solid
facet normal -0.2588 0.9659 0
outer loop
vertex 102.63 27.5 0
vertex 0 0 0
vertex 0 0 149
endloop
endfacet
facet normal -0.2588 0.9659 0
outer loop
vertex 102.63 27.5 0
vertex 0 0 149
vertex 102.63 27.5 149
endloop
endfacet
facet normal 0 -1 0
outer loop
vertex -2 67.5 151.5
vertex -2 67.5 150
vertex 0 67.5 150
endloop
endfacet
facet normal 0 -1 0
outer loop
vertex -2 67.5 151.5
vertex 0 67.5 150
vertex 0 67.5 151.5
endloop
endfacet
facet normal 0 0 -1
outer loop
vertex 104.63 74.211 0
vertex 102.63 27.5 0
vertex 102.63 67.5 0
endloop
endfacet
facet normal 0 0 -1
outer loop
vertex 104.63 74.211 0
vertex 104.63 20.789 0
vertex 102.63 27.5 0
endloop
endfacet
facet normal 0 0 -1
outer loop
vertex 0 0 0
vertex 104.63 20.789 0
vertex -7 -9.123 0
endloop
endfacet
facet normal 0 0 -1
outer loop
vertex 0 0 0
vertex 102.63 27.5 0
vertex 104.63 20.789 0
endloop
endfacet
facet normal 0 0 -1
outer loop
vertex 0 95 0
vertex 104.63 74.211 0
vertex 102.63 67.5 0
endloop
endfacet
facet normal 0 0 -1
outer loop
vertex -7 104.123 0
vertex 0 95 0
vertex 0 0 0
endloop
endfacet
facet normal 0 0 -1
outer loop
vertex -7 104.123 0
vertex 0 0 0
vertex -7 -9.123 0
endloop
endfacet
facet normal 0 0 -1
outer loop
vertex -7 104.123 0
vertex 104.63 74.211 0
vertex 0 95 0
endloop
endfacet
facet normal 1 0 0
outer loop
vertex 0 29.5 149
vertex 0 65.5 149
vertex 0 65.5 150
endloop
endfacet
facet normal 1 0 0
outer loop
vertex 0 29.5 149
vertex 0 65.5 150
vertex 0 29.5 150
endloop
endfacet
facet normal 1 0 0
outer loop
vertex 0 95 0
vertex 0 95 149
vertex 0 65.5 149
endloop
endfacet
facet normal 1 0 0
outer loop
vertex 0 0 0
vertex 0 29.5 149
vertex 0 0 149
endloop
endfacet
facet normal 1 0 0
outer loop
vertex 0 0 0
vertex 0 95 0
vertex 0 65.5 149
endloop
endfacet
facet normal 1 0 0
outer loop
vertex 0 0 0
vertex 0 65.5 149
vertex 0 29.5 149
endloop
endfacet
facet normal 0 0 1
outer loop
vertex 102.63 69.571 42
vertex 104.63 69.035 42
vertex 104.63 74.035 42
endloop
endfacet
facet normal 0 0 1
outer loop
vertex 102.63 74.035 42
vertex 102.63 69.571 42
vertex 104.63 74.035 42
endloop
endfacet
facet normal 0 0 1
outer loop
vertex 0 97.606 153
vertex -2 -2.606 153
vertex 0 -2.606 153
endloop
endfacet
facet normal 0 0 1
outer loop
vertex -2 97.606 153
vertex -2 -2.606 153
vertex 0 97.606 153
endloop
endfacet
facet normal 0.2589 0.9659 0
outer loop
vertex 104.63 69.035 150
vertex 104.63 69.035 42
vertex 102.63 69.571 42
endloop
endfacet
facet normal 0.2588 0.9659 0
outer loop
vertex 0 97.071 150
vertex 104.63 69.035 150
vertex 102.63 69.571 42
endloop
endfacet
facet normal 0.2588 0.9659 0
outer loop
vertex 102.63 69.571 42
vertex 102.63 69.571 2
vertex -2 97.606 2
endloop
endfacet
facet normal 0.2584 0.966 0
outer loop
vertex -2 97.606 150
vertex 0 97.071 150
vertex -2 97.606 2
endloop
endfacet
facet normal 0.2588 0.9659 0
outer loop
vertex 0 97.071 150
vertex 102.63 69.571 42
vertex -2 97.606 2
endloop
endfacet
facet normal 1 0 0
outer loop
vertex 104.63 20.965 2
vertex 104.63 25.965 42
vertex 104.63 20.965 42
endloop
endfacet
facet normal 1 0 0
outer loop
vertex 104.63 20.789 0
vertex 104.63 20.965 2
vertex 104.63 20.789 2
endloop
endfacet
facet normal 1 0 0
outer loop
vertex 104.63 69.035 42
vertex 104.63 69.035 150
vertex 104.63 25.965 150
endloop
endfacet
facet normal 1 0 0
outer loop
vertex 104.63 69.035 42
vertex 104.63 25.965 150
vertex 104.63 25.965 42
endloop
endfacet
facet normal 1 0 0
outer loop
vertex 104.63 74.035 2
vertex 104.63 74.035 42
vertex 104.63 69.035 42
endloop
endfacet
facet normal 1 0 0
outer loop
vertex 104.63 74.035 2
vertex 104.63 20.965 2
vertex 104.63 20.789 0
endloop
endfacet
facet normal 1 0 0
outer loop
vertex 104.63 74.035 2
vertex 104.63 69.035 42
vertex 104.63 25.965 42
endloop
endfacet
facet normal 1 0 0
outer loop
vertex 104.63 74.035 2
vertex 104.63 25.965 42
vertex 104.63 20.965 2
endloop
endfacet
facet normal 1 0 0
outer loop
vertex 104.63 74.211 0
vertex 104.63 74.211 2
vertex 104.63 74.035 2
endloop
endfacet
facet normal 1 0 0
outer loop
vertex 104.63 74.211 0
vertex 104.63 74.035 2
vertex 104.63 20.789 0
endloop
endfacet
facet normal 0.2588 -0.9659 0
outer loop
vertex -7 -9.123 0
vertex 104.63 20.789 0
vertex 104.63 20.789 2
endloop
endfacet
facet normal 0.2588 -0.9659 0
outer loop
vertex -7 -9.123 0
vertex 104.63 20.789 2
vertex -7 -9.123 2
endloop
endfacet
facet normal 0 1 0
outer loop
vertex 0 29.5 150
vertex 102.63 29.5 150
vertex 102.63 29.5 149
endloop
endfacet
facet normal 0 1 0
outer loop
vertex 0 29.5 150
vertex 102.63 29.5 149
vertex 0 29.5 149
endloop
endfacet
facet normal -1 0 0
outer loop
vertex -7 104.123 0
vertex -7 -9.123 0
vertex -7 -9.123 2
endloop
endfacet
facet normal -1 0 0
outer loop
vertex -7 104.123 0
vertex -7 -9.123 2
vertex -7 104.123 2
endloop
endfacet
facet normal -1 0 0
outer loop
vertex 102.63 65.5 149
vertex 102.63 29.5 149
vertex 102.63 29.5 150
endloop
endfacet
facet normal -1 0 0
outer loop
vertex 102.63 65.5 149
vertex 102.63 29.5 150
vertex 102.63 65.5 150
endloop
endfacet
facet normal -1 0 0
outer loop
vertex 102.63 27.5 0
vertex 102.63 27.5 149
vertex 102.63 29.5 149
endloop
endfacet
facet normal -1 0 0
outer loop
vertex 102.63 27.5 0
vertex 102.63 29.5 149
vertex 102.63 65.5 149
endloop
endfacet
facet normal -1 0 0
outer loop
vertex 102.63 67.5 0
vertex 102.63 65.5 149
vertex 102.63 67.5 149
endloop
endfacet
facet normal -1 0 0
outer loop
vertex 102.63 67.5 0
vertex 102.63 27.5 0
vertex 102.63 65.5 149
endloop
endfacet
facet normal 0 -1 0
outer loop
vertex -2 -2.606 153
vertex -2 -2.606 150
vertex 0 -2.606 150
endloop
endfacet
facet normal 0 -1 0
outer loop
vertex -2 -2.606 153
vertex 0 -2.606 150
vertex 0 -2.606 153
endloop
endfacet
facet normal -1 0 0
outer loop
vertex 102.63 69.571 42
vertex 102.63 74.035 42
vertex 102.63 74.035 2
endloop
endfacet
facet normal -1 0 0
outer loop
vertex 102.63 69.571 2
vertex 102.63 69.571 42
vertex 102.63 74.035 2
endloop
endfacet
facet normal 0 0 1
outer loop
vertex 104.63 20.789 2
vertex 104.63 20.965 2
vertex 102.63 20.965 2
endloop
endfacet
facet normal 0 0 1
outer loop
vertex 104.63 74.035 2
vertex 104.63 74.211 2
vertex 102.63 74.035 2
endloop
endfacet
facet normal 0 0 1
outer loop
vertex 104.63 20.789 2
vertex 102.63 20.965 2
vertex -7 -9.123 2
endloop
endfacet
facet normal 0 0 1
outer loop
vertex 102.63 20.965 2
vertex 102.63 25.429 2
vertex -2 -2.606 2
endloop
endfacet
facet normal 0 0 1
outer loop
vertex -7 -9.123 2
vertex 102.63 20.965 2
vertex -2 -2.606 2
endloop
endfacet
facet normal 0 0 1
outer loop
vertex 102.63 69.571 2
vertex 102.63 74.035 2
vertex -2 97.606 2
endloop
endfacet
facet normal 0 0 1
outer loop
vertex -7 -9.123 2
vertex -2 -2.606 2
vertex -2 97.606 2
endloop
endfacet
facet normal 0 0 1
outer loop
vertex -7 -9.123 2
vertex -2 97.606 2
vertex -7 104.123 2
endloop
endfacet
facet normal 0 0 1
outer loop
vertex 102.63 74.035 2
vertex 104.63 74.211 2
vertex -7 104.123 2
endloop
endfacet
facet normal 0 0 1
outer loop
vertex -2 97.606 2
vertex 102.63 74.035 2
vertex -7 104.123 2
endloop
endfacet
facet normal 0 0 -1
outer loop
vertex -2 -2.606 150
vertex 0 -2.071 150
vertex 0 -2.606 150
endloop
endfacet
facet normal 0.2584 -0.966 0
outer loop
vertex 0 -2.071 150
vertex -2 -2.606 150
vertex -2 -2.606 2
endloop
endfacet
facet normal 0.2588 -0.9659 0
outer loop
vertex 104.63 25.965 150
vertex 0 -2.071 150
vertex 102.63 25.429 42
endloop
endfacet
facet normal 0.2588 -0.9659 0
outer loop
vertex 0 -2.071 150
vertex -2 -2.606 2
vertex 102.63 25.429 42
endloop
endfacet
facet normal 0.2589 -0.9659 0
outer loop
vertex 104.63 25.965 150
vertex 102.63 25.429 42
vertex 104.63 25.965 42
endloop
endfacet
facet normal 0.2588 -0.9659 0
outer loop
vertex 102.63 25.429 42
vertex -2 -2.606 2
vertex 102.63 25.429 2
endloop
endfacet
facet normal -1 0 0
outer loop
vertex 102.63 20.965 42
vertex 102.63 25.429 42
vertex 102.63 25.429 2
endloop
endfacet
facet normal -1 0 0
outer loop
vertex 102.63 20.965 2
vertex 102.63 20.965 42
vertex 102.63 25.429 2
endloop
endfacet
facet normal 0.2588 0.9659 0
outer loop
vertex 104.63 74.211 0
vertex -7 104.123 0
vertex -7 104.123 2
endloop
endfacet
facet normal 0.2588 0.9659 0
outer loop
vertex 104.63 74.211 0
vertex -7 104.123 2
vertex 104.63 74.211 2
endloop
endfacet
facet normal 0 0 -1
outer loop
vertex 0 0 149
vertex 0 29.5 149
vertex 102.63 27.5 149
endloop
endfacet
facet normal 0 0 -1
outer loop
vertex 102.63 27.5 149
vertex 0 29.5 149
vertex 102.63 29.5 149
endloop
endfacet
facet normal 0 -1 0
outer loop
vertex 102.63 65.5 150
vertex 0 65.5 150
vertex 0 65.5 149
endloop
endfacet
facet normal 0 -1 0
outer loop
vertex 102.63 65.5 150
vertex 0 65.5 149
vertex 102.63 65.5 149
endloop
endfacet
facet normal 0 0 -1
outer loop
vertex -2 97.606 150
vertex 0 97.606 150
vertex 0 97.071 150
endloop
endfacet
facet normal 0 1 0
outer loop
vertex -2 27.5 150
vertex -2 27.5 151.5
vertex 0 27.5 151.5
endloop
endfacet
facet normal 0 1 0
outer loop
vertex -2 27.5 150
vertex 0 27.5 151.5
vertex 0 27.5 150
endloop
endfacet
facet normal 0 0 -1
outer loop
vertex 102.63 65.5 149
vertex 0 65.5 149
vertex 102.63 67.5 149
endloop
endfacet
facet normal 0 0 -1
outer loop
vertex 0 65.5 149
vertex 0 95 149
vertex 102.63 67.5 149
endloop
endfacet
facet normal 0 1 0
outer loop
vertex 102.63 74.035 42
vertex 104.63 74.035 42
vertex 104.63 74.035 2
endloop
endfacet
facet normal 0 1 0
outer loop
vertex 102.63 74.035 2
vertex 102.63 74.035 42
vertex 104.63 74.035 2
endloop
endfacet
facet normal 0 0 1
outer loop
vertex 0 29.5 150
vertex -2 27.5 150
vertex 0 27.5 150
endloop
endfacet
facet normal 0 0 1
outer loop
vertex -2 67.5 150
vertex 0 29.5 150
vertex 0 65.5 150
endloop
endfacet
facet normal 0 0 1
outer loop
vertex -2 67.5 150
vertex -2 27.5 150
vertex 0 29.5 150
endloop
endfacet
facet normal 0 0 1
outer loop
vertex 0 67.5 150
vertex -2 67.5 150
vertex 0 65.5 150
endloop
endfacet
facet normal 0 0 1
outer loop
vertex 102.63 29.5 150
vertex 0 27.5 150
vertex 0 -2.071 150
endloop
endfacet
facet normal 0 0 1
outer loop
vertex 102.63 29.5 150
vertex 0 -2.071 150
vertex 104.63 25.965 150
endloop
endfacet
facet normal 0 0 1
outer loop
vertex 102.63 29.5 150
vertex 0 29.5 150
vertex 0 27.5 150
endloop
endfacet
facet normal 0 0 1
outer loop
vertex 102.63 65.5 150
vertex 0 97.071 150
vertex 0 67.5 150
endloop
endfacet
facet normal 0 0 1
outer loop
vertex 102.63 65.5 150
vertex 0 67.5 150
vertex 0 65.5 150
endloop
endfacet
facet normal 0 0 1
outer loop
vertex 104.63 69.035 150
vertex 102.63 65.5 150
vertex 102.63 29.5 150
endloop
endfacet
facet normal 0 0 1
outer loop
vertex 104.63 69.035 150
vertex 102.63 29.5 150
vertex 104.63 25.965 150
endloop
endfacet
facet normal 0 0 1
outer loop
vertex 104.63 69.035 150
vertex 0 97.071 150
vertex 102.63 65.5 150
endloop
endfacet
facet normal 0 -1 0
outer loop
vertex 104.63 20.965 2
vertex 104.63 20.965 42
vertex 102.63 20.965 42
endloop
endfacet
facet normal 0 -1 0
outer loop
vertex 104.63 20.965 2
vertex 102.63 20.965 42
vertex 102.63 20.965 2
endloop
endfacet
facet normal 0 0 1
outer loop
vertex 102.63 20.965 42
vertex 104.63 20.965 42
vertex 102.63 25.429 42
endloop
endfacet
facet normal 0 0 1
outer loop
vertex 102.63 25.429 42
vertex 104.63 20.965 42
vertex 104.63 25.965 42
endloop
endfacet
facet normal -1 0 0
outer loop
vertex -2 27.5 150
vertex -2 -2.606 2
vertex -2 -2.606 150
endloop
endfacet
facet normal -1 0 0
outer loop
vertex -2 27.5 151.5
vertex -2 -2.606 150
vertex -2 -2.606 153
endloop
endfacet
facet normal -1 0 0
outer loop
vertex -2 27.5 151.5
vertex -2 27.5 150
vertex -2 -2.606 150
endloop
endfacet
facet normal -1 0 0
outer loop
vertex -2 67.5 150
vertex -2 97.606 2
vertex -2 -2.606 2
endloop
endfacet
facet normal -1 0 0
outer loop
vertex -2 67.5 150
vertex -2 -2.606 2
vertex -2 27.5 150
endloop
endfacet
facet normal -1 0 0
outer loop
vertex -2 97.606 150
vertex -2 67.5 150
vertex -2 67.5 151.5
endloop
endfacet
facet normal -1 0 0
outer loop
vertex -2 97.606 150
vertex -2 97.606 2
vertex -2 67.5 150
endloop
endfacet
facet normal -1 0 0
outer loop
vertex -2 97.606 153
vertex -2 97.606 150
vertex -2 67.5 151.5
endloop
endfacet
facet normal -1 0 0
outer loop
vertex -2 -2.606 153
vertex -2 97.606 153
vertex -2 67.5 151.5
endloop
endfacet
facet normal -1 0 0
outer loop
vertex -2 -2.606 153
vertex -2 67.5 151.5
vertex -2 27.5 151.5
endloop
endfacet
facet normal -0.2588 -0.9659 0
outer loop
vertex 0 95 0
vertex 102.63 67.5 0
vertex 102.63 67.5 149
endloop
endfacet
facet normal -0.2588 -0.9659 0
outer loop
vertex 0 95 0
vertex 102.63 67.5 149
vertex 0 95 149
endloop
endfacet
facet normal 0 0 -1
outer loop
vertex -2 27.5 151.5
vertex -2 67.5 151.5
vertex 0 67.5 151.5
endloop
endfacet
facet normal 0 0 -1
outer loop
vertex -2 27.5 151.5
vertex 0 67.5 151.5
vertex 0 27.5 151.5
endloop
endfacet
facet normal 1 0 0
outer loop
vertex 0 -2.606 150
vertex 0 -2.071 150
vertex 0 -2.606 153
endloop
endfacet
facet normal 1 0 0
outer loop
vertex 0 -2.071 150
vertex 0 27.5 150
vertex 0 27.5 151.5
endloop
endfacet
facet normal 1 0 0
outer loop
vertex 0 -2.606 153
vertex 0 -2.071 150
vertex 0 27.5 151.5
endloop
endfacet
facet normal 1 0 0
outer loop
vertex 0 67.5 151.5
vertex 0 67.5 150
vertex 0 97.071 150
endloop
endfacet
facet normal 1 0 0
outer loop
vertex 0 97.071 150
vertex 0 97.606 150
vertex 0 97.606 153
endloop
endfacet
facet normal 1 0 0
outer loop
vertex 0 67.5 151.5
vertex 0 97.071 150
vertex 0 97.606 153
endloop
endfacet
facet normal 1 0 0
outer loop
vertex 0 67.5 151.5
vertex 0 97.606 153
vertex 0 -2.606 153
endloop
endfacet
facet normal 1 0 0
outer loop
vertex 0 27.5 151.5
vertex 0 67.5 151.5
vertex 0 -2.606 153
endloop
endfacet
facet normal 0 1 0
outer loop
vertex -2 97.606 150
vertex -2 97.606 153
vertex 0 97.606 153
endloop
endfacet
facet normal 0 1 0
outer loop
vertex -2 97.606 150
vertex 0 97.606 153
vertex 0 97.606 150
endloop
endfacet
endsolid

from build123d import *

# Parameters (mm, degrees)
BOSS_EXTRUDE1_DEPTH   = 150
BOSS_EXTRUDE3_DEPTH   = 1
BOSS_EXTRUDE3_2_DEPTH = 1
BOSS_EXTRUDE5_DEPTH   = 2
BOSS_EXTRUDE6_DEPTH   = 2
SKETCH8_W             = 40
SKETCH8_H             = 5
BOSS_EXTRUDE7_DEPTH   = 2


with BuildPart() as part:
    # Sketch1 → Boss-Extrude1 (new body)
    with BuildSketch(Plane.XY):
        Polygon((104.63, 25.965351431), (104.63, 69.034648569), (-2, 97.60645993), (-2, -2.60645993), align=None)
        Polygon((102.63, 67.5), (0, 95), (0, 0), (102.63, 27.5), align=None, mode=Mode.SUBTRACT)
    extrude(amount=BOSS_EXTRUDE1_DEPTH)



with BuildPart() as body_2:
    # Sketch3 → Boss-Extrude3 (new body)
    with BuildSketch(Plane.XY.offset(150)):
        Polygon((0, 65.5), (102.63, 65.5), (102.63, 67.5), (0, 95), align=None)
    extrude(amount=-BOSS_EXTRUDE3_DEPTH)


with BuildPart() as body_3:
    # Sketch3 → Boss-Extrude3 2 (new body)
    with BuildSketch(Plane.XY.offset(150)):
        Polygon((102.63, 27.5), (102.63, 29.5), (0, 29.5), (0, 0), align=None)
    extrude(amount=-BOSS_EXTRUDE3_2_DEPTH)


with BuildPart() as part_1:
    add(part.part)

    add(body_2.part)  # Boss-Extrude5 merges body 2

    add(body_3.part)  # Boss-Extrude5 merges body 3
    # Sketch6 → Boss-Extrude5 (add)
    with BuildSketch(Plane.ZY.offset(2)):
        Polygon((150, 67.5), (151.5, 67.5), (151.5, 27.5), (150, 27.5), (150, -2.60645993), (153, -2.60645993), (153, 97.60645993), (150, 97.60645993), align=None)
    extrude(amount=-BOSS_EXTRUDE5_DEPTH)

    # Sketch7 → Boss-Extrude6 (add)
    with BuildSketch(Plane(origin=(0, 0, 0), x_dir=(-1, 0, 0), z_dir=(0, 0, -1))):
        Polygon((-104.63, 20.788965809), (7, -9.122609754), (7, 104.122609754), (-104.63, 74.211034191), (-104.63, 69.034648569), (2, 97.60645993), (2, -2.60645993), (-104.63, 25.965351431), align=None)
    extrude(amount=-BOSS_EXTRUDE6_DEPTH)

    # Sketch8 → Boss-Extrude7 (add)
    with BuildSketch(Plane(origin=(104.63, 0, 0), x_dir=(0, 0, -1), z_dir=(1, 0, 0))):
        with Locations((-22, 71.534648569)):
            Rectangle(SKETCH8_W, SKETCH8_H)
        with Locations((-22, 23.465351431)):
            Rectangle(SKETCH8_W, SKETCH8_H)
    extrude(amount=-BOSS_EXTRUDE7_DEPTH)


solid = part_1.part
